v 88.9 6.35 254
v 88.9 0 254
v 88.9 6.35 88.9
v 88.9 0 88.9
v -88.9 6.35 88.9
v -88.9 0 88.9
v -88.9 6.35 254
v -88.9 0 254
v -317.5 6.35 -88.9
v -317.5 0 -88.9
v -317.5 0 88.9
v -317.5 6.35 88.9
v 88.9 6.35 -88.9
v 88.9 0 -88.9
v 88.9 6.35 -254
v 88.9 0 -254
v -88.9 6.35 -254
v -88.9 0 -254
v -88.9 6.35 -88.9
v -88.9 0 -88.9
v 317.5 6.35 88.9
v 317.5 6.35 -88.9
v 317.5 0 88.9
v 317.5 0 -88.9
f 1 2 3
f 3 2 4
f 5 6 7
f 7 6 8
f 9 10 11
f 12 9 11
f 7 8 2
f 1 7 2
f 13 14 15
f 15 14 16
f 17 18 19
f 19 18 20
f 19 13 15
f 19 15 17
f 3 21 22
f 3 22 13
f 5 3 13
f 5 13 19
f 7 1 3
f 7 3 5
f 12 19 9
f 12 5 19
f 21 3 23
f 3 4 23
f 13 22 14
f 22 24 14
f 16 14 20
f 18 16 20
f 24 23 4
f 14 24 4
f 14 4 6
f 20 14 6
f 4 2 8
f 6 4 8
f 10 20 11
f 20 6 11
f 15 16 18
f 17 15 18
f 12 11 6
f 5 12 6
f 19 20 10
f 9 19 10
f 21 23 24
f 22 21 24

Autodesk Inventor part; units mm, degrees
ref_plane "YZ Plane" through (0, 0, 0) normal (1, 0, 0) x (0, 1, 0)
ref_plane "XZ Plane" through (0, 0, 0) normal (0, 1, 0) x (-1, 0, 0)
ref_plane "XY Plane" through (0, 0, 0) normal (0, 0, 1) x (1, 0, 0)
sketch "Sketch1" plane through (0, 0, 0) normal (0, 1, 0) x (-1, 0, 0)
  line L0 (88.9, 254) -> (-88.9, 254)
  line L1 (-88.9, -254) -> (88.9, -254)
  line L2 (0, -266.7) -> (0, 266.7) projected
  line L3 (-444.5, 0) -> (444.5, 0) projected
  line L4 (88.9, -88.9) -> (317.5, -88.9)
  line L5 (317.5, -88.9) -> (317.5, 88.9)
  line L6 (317.5, 88.9) -> (88.9, 88.9)
  line L7 (-88.9, 88.9) -> (-317.5, 88.9)
  line L8 (-317.5, 88.9) -> (-317.5, -88.9)
  line L9 (-317.5, -88.9) -> (-88.9, -88.9)
  line L10 (88.9, -254) -> (88.9, -88.9)
  line L11 (88.9, 88.9) -> (88.9, 254)
  line L12 (-88.9, 254) -> (-88.9, 88.9)
  line L13 (-88.9, -88.9) -> (-88.9, -254)
  line L14 (88.9, -88.9) -> (88.9, 88.9)
  line L15 (-88.9, -88.9) -> (-88.9, 88.9)
  line L16 (88.9, -88.9) -> (-88.9, -88.9)
  line L17 (-88.9, 88.9) -> (88.9, 88.9)
  point P0 (0, 0)
  dimension "d1" = 177.8
  dimension "d5" = 177.8
  dimension "d6" = 635
  dimension "d7" = 508
extrude "Extrusion1" add sketch "Sketch1" along normal blind 6.35
equation "\"d1\" = Height"
equation "\"d5\" = Width"
equation "\"d6\" = HLength"
equation "\"d7\" = WLength"
equation "\"HLength\" = 635"
equation "\"Height\" = 177.8"
equation "\"Width\" = 177.8"
equation "\"WLength\" = 508"
properties part number "Electronics Board"
